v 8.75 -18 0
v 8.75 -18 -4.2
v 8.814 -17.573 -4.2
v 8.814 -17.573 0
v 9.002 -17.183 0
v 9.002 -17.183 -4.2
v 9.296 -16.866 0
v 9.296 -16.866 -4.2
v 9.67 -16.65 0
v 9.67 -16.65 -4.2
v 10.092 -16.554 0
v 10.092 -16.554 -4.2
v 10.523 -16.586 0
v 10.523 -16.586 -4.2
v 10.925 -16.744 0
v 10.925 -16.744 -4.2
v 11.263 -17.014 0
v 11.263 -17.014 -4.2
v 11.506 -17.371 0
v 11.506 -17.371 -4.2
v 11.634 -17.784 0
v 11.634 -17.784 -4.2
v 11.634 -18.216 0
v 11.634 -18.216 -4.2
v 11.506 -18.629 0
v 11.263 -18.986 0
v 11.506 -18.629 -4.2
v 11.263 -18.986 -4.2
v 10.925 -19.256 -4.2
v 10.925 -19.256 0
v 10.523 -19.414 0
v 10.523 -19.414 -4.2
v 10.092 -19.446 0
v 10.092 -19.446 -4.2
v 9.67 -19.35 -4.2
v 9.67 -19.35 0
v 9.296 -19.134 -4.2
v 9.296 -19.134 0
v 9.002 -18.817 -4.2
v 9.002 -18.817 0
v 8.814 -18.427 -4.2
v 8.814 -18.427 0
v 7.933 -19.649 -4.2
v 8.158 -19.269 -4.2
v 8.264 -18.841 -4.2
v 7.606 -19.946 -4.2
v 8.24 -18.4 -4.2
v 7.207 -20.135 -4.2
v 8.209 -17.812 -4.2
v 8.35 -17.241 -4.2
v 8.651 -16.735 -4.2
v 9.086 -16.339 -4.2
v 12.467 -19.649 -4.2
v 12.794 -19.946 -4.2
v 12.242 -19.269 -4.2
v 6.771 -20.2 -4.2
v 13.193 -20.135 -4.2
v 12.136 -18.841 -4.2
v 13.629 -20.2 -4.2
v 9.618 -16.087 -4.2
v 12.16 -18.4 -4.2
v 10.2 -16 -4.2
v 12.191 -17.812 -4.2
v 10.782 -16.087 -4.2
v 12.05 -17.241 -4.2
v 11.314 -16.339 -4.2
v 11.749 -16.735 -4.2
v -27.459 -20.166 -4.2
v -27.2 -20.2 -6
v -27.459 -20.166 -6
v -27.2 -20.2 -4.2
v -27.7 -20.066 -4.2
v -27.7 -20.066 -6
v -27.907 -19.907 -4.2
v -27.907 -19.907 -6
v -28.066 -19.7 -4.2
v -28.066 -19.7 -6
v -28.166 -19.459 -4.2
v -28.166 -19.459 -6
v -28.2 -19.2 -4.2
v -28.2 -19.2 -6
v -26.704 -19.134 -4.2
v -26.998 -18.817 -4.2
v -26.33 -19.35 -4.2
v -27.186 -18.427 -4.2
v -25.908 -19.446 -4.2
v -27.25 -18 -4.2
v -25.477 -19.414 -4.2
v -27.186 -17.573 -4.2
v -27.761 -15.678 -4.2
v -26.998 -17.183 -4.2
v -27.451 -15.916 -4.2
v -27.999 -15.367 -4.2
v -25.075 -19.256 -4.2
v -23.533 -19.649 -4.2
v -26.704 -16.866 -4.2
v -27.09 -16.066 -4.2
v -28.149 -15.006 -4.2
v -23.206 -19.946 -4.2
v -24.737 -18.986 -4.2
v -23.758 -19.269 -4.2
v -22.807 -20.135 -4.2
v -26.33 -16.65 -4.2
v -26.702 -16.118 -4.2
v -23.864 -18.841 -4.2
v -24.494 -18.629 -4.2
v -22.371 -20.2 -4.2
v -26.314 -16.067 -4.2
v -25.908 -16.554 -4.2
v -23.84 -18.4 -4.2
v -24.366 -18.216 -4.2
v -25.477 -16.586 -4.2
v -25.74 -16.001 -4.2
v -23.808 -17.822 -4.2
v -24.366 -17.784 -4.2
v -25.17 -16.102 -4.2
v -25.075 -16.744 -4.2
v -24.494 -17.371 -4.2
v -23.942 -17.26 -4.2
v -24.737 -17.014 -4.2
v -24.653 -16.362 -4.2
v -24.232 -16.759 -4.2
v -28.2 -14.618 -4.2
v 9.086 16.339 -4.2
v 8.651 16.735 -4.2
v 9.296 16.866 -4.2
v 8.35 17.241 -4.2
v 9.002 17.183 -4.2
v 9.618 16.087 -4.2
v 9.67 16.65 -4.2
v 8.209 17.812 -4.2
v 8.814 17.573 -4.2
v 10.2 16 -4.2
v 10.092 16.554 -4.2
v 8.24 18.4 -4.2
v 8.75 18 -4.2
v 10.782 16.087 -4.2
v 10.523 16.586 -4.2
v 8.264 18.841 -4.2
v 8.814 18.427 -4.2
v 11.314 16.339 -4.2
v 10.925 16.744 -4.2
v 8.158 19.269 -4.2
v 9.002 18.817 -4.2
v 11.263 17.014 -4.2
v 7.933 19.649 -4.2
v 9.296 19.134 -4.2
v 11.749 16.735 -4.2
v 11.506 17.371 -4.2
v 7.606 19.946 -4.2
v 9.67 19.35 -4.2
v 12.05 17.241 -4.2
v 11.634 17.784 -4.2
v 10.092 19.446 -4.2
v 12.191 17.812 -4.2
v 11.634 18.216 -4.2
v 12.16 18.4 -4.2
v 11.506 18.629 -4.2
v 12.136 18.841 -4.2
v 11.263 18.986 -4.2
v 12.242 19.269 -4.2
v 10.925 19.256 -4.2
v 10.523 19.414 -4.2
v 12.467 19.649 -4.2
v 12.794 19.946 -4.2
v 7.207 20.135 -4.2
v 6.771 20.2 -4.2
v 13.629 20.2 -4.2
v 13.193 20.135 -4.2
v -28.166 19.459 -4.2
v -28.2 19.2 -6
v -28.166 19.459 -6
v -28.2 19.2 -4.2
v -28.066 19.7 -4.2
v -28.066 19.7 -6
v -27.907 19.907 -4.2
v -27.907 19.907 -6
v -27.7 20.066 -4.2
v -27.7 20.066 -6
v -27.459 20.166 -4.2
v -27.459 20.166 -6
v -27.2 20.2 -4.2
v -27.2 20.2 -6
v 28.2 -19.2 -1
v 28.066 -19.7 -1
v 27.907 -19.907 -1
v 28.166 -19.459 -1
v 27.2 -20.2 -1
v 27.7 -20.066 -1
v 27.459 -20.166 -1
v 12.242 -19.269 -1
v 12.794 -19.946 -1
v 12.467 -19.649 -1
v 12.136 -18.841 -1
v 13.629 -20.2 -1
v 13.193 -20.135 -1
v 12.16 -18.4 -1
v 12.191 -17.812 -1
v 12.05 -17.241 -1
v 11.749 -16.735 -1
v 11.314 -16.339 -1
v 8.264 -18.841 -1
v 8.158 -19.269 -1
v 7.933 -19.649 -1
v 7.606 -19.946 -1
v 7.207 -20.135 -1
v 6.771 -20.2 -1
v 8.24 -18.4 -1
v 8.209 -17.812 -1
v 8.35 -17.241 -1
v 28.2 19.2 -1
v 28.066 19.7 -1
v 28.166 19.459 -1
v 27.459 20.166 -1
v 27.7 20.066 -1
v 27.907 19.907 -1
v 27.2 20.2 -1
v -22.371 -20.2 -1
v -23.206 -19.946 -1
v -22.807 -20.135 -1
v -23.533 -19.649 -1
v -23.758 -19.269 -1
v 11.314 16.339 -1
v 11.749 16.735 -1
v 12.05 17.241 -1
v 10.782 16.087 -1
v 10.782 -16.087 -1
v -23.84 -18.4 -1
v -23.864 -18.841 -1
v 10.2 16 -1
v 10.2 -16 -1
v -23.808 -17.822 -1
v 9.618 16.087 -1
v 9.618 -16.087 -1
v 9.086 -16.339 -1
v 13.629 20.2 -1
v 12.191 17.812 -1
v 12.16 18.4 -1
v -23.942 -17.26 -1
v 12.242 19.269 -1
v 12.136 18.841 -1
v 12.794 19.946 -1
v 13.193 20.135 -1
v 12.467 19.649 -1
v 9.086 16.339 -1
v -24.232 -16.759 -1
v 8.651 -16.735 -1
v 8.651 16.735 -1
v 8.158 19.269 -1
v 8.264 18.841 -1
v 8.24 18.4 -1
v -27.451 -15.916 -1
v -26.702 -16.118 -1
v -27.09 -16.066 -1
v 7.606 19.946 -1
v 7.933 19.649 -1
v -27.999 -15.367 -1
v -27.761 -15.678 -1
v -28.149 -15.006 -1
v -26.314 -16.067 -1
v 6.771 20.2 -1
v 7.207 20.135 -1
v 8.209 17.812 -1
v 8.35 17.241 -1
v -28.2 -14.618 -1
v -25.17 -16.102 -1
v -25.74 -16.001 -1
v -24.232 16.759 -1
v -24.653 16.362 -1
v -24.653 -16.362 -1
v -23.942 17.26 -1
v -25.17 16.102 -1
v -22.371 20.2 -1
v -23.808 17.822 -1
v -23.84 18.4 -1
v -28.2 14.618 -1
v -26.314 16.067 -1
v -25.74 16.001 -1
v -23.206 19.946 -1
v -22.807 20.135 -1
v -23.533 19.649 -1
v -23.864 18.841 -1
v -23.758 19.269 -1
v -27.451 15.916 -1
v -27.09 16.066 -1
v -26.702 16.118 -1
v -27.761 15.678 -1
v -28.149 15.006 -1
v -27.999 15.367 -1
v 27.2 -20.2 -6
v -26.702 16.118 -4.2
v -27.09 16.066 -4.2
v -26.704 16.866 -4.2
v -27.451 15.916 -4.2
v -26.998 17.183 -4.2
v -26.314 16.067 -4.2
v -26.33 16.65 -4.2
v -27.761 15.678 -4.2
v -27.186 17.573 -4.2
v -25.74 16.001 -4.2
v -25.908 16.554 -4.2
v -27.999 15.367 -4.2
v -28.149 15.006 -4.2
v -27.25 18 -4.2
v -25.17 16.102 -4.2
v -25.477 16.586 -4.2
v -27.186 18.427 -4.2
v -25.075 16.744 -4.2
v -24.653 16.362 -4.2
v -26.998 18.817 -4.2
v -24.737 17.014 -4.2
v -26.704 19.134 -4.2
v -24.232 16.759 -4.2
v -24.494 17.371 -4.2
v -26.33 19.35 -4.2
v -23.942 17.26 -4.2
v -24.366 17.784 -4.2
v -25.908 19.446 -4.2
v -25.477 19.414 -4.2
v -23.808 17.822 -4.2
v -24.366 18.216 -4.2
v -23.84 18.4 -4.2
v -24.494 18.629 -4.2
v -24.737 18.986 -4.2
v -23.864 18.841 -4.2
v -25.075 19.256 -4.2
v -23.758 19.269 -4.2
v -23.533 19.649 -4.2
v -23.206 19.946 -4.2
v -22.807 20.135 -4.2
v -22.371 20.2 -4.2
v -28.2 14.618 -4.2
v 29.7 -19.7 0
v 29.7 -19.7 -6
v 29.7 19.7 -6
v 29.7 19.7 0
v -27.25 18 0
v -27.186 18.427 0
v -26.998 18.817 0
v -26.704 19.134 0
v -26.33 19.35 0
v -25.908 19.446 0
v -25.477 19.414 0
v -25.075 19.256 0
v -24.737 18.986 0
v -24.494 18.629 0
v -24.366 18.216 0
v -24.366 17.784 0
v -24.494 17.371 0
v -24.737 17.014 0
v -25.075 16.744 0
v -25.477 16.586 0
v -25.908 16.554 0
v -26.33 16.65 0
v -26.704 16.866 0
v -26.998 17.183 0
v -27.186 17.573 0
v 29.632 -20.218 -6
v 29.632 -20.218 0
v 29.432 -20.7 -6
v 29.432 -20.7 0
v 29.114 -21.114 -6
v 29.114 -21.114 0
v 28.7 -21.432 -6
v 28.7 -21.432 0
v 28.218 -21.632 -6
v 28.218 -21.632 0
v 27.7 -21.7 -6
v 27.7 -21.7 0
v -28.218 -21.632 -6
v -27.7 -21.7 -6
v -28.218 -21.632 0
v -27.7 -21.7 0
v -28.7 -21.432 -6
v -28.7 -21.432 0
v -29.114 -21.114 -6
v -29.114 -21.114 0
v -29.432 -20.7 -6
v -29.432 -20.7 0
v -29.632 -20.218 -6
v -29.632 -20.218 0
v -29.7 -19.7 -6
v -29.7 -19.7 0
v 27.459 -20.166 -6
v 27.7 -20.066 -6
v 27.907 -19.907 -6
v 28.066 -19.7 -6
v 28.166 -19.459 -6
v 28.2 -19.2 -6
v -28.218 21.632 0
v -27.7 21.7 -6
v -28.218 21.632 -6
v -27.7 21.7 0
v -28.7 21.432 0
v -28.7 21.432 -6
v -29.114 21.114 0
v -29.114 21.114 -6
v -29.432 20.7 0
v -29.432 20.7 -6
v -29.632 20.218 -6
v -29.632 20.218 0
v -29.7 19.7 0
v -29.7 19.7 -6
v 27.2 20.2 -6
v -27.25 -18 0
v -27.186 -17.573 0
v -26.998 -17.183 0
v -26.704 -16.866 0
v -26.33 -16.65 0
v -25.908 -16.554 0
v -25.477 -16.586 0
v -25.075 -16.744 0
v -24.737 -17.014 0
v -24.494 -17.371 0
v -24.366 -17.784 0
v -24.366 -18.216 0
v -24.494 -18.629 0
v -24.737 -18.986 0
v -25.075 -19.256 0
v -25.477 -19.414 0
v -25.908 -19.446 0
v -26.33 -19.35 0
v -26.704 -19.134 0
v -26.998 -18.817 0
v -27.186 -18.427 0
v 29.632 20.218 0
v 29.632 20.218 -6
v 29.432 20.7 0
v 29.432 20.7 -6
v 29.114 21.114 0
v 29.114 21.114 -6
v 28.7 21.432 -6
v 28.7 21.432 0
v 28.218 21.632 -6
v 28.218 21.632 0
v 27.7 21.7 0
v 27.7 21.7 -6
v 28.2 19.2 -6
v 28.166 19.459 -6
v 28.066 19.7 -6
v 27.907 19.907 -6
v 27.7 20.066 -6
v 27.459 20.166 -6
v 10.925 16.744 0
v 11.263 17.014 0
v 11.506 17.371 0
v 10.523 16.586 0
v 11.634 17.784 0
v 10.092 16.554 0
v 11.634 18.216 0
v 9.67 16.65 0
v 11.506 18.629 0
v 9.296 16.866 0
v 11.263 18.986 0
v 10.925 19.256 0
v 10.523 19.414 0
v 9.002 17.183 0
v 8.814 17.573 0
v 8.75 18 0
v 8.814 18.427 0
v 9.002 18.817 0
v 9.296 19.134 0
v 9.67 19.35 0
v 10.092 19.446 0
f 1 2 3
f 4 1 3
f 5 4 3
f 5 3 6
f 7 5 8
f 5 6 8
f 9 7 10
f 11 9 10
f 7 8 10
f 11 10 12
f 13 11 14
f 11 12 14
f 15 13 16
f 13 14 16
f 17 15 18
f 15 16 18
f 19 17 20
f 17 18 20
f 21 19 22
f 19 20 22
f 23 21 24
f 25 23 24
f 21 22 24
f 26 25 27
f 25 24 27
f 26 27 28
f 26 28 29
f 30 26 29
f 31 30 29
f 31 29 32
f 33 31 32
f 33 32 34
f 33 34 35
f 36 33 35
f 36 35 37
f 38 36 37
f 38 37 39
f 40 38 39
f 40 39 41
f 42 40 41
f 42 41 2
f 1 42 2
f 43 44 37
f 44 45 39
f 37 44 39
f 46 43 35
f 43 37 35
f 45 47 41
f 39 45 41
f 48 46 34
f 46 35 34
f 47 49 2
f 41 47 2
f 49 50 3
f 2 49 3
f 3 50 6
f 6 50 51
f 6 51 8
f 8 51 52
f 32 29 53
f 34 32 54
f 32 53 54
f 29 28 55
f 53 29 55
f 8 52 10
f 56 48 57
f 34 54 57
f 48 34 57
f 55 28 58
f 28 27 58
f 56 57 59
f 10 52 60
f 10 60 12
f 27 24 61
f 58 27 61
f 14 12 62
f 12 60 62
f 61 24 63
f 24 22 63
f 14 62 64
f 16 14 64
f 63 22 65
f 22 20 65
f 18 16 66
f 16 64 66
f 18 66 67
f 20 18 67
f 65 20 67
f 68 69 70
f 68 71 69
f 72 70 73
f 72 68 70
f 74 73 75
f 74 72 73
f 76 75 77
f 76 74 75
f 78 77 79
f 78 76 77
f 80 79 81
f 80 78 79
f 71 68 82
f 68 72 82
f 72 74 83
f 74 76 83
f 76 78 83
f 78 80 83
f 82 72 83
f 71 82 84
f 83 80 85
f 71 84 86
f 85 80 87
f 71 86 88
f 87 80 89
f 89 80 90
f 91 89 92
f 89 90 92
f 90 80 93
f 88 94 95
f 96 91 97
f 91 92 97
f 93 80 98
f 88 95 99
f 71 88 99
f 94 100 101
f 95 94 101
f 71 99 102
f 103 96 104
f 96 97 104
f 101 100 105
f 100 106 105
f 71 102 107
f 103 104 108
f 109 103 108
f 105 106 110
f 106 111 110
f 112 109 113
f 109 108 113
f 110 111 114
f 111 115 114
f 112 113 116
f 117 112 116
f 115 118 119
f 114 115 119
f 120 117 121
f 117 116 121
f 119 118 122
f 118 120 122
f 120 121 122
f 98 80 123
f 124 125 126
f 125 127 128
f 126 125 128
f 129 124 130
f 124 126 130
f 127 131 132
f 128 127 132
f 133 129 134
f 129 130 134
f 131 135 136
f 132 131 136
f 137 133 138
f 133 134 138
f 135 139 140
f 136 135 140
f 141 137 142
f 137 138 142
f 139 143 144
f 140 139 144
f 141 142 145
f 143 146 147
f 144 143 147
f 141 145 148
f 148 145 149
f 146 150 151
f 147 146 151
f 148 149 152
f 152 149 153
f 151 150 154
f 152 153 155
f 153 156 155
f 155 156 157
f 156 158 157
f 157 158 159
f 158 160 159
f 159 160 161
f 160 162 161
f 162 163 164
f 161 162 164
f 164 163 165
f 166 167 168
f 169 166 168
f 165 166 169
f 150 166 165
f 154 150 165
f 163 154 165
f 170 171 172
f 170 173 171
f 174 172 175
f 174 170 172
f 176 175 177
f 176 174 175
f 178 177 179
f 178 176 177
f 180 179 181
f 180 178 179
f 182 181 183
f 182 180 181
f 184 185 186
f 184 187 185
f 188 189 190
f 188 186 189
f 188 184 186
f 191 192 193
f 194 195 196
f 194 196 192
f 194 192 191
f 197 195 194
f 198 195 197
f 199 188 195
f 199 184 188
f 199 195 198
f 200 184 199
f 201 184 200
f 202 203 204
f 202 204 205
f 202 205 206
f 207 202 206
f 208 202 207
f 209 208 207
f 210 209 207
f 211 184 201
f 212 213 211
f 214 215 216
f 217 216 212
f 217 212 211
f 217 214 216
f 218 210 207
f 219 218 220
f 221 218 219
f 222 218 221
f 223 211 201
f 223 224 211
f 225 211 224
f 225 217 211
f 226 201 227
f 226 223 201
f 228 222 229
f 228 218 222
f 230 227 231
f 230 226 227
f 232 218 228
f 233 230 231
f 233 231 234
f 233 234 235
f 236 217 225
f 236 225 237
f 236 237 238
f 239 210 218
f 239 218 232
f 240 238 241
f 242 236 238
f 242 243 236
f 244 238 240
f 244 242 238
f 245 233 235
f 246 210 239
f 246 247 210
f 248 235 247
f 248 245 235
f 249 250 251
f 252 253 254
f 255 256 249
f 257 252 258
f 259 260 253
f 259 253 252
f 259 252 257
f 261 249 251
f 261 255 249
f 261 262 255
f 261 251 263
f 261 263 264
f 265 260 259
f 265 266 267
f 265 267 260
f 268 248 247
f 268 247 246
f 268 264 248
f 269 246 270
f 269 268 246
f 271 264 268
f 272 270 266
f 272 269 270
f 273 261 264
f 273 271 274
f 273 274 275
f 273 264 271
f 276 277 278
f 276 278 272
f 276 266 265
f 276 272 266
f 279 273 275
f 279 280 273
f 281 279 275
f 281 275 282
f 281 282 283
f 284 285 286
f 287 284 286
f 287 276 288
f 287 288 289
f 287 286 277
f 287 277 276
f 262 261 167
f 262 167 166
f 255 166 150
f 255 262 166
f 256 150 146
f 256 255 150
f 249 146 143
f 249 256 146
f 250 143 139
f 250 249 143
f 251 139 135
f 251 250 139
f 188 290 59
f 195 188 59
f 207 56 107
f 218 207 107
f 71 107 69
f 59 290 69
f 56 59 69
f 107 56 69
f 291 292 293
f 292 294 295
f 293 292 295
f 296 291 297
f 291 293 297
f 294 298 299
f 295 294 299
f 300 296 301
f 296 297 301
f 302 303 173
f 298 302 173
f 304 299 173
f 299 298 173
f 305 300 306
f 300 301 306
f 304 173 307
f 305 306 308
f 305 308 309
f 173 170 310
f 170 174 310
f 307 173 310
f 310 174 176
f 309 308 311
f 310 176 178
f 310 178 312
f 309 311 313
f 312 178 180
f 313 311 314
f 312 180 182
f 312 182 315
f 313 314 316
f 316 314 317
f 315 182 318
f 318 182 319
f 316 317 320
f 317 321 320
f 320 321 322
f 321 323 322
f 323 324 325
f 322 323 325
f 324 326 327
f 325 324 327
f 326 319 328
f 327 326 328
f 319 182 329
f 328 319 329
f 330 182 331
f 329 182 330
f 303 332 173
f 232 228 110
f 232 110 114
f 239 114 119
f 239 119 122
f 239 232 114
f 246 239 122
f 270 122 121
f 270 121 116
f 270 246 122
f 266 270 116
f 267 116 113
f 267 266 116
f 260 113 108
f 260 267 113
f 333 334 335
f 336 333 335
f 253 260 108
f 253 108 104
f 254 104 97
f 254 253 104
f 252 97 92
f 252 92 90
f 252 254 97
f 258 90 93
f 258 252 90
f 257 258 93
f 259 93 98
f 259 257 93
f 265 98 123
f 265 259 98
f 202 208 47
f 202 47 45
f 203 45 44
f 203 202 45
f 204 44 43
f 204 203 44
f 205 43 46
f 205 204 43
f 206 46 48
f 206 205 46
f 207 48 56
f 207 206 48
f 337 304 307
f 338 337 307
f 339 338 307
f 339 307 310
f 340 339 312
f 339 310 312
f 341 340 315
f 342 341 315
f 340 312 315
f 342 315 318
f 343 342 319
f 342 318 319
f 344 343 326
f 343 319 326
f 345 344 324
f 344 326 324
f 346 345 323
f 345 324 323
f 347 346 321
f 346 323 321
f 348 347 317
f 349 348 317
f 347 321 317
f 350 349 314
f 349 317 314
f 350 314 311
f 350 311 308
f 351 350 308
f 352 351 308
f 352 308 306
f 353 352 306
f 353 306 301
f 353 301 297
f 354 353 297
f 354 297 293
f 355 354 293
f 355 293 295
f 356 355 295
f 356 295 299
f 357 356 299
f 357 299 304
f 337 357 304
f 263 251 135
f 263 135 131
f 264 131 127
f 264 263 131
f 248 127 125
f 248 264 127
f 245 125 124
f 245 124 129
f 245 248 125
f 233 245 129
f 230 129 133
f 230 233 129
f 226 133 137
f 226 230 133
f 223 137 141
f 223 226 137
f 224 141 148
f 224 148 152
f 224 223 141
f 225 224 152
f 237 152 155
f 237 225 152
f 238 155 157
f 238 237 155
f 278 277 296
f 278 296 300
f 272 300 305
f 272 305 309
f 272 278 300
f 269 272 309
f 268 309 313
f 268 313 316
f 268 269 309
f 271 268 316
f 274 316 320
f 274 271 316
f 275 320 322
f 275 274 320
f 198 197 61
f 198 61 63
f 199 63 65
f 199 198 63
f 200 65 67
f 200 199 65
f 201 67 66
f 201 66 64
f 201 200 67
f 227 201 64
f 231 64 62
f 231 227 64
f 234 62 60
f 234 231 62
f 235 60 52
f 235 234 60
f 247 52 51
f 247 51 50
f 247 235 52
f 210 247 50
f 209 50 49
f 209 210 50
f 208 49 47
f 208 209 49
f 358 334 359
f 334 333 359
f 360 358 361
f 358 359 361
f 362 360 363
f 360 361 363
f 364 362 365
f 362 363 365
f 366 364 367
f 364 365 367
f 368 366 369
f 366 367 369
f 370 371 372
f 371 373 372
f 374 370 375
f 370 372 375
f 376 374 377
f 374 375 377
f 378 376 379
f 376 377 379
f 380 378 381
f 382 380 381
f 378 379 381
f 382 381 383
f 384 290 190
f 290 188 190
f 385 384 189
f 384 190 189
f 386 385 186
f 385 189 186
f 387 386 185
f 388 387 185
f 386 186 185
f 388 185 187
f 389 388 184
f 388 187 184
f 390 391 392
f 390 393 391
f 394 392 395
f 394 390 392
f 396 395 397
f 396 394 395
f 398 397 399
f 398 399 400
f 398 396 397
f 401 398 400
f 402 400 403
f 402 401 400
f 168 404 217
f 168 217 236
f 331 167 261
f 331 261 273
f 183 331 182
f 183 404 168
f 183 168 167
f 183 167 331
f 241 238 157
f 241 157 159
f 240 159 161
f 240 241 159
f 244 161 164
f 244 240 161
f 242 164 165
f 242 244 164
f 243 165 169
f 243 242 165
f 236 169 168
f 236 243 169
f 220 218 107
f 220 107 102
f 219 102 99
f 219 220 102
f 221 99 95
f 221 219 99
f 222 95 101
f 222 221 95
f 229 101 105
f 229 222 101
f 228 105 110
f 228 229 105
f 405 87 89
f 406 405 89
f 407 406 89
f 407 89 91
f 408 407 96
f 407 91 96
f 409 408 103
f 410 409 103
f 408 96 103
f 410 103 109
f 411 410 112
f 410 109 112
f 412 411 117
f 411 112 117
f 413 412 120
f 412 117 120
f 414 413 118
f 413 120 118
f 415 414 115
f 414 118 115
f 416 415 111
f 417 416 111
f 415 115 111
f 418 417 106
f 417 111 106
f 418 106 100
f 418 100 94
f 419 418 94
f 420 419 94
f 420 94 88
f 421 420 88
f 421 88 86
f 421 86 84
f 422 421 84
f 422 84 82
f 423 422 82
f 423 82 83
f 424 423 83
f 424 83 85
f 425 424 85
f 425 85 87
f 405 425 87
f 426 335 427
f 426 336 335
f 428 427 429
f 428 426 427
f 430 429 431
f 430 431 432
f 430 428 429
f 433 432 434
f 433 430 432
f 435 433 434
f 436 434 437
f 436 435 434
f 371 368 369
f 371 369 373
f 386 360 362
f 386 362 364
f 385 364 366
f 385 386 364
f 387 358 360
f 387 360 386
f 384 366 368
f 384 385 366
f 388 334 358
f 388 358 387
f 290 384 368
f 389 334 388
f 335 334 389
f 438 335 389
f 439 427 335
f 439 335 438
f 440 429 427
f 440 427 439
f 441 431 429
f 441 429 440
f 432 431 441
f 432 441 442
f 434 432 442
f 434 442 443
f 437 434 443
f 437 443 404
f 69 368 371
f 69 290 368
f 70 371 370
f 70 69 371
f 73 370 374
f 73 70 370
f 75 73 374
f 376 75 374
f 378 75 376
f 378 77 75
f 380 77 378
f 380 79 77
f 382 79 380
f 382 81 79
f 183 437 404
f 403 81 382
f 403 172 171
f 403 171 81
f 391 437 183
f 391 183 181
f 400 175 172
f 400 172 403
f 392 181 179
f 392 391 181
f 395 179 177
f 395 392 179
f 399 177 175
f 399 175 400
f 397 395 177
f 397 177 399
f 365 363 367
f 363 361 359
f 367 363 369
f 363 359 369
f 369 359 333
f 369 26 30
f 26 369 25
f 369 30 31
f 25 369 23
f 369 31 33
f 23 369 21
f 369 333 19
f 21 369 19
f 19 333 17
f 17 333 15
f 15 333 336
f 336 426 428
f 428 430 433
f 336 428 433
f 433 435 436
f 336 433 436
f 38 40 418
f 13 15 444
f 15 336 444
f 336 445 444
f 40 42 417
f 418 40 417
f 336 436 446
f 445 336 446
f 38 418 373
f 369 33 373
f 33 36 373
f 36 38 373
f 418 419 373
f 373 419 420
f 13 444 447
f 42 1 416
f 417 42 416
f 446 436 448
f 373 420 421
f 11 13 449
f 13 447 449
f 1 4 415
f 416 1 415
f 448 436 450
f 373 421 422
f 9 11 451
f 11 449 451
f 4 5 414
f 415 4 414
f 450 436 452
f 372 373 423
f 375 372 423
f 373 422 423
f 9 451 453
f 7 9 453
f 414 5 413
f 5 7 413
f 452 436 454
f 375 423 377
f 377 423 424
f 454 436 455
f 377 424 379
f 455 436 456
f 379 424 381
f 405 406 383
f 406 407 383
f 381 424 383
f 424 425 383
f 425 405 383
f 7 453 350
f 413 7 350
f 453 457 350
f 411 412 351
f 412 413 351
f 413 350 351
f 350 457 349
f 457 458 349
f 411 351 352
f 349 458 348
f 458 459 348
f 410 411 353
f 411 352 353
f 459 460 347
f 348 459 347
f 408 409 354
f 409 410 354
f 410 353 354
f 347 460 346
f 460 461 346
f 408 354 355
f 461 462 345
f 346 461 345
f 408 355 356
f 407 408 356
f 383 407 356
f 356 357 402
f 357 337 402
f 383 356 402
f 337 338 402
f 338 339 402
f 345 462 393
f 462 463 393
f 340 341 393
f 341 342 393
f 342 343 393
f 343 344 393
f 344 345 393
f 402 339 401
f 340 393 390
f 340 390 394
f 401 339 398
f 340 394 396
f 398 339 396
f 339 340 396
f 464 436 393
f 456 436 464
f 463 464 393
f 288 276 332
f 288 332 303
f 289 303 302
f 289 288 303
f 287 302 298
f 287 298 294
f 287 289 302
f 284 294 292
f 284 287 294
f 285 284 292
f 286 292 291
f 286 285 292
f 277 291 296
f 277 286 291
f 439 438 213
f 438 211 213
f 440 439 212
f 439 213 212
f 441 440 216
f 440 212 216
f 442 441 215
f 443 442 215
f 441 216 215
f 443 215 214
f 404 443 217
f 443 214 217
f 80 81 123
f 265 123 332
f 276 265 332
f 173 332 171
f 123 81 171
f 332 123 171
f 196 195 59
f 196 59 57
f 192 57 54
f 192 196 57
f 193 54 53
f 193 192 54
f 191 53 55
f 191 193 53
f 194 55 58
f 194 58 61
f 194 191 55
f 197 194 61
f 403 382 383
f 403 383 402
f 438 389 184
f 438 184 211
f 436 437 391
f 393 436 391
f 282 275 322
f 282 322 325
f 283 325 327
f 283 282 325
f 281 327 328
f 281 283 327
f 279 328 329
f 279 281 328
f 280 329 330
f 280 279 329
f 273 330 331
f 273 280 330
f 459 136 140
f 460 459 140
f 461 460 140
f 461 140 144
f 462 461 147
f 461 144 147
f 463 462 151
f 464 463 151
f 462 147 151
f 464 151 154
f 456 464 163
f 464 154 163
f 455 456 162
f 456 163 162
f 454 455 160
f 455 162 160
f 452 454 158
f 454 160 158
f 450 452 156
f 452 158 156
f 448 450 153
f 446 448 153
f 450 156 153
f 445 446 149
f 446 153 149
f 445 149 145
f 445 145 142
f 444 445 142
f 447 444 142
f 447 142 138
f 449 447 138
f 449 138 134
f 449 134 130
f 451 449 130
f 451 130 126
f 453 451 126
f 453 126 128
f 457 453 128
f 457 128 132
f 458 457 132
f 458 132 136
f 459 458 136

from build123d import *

# Parameters (mm, degrees)
SKETCH_1_W          = 59.4
SKETCH_1_H          = 43.4
EXTRUDE_1_DEPTH     = 6
SKETCH_2_W          = 56.4
SKETCH_2_H          = 40.4
CUT_EXTRUDE_1_DEPTH = 5
EXTRUDE_2_DEPTH     = 3.2
EXTRUDE_3_DEPTH     = 3.2
EXTRUDE_4_DEPTH     = 3.2
EXTRUDE_5_DEPTH     = 3.2
FILLET_1_R          = 1
FILLET_2_R          = 2
SKETCH_7_R          = 1.45
CUT_EXTRUDE_2_DEPTH = 20


with BuildPart() as part:
    # 草图1 → 凸台-拉伸1 (new body)
    with BuildSketch(Plane(origin=(0, 0, -6), x_dir=(-1, 0, 0), z_dir=(0, 0, -1))):
        Rectangle(SKETCH_1_W, SKETCH_1_H)
    extrude(amount=-EXTRUDE_1_DEPTH)

    # 草图2 → 切除-拉伸1 (cut)
    with BuildSketch(Plane(origin=(0, 0, -6), x_dir=(-1, 0, 0), z_dir=(0, 0, -1))):
        Rectangle(SKETCH_2_W, SKETCH_2_H)
    extrude(amount=-CUT_EXTRUDE_1_DEPTH, mode=Mode.SUBTRACT)

    # 草图3 → 凸台-拉伸2 (add)
    with BuildSketch(Plane(origin=(0, 0, -1), x_dir=(-1, 0, 0), z_dir=(0, 0, -1))):
        with BuildLine():
            Line((-13.62928564, 20.2), (-6.77071436, 20.2))
            ThreePointArc((-6.77071436, 20.2), (-7.932609364, 19.648683298), (-8.240408206, 18.4))
            ThreePointArc((-8.240408206, 18.4), (-10.2, 16), (-12.159591794, 18.4))
            ThreePointArc((-12.159591794, 18.4), (-12.467390636, 19.648683298), (-13.62928564, 20.2))
        make_face()
    extrude(amount=EXTRUDE_2_DEPTH)

    # 草图4 → 凸台-拉伸3 (add)
    with BuildSketch(Plane(origin=(0, 0, -1), x_dir=(-1, 0, 0), z_dir=(0, 0, -1))):
        with BuildLine():
            Line((22.37071436, 20.2), (28.2, 20.2))
            Line((28.2, 20.2), (28.2, 14.617693095))
            ThreePointArc((28.2, 14.617693095), (27.6141741, 15.806930546), (26.314285714, 16.067253197))
            ThreePointArc((26.314285714, 16.067253197), (24.427901488, 16.544889808), (23.840408206, 18.4))
            ThreePointArc((23.840408206, 18.4), (23.532609364, 19.648683298), (22.37071436, 20.2))
        make_face()
    extrude(amount=EXTRUDE_3_DEPTH)

    # 草图5 → 凸台-拉伸4 (add)
    with BuildSketch(Plane(origin=(0, 0, -1), x_dir=(-1, 0, 0), z_dir=(0, 0, -1))):
        with BuildLine():
            Line((28.2, -14.617693095), (28.2, -20.2))
            Line((28.2, -20.2), (22.37071436, -20.2))
            ThreePointArc((22.37071436, -20.2), (23.532609364, -19.648683298), (23.840408206, -18.4))
            ThreePointArc((23.840408206, -18.4), (24.427901488, -16.544889808), (26.314285714, -16.067253197))
            ThreePointArc((26.314285714, -16.067253197), (27.6141741, -15.806930546), (28.2, -14.617693095))
        make_face()
    extrude(amount=EXTRUDE_4_DEPTH)

    # 草图6 → 凸台-拉伸5 (add)
    with BuildSketch(Plane(origin=(0, 0, -1), x_dir=(-1, 0, 0), z_dir=(0, 0, -1))):
        with BuildLine():
            Line((-6.77071436, -20.2), (-13.62928564, -20.2))
            ThreePointArc((-13.62928564, -20.2), (-12.467390636, -19.648683298), (-12.159591794, -18.4))
            ThreePointArc((-12.159591794, -18.4), (-10.2, -16), (-8.240408206, -18.4))
            ThreePointArc((-8.240408206, -18.4), (-7.932609364, -19.648683298), (-6.77071436, -20.2))
        make_face()
    extrude(amount=EXTRUDE_5_DEPTH)

    # 圆角1
    fillet_1_edges = [part.edges().sort_by_distance(p)[0] for p in [
        (28.2, -20.2, -3.5),
        (28.2, 20.2, -3.5),
        (-28.2, 20.2, -5.1),
        (-28.2, -20.2, -5.1),
    ]]
    fillet(fillet_1_edges, radius=FILLET_1_R)

    # 圆角2
    fillet_2_edges = [part.edges().sort_by_distance(p)[0] for p in [
        (-29.7, 21.7, -3),
        (-29.7, -21.7, -3),
        (29.7, -21.7, -3),
        (29.7, 21.7, -3),
    ]]
    fillet(fillet_2_edges, radius=FILLET_2_R)

    # 草图7 → 切除-拉伸2 (cut)
    with BuildSketch(Plane(origin=(0, 0, -4.2), x_dir=(-1, 0, 0), z_dir=(0, 0, -1))):
        with Locations((-10.2, 18)):
            Circle(SKETCH_7_R)
        with Locations((-10.2, -18)):
            Circle(SKETCH_7_R)
        with Locations((25.8, 18)):
            Circle(SKETCH_7_R)
        with Locations((25.8, -18)):
            Circle(SKETCH_7_R)
    extrude(amount=-CUT_EXTRUDE_2_DEPTH, mode=Mode.SUBTRACT)


solid = part.part
